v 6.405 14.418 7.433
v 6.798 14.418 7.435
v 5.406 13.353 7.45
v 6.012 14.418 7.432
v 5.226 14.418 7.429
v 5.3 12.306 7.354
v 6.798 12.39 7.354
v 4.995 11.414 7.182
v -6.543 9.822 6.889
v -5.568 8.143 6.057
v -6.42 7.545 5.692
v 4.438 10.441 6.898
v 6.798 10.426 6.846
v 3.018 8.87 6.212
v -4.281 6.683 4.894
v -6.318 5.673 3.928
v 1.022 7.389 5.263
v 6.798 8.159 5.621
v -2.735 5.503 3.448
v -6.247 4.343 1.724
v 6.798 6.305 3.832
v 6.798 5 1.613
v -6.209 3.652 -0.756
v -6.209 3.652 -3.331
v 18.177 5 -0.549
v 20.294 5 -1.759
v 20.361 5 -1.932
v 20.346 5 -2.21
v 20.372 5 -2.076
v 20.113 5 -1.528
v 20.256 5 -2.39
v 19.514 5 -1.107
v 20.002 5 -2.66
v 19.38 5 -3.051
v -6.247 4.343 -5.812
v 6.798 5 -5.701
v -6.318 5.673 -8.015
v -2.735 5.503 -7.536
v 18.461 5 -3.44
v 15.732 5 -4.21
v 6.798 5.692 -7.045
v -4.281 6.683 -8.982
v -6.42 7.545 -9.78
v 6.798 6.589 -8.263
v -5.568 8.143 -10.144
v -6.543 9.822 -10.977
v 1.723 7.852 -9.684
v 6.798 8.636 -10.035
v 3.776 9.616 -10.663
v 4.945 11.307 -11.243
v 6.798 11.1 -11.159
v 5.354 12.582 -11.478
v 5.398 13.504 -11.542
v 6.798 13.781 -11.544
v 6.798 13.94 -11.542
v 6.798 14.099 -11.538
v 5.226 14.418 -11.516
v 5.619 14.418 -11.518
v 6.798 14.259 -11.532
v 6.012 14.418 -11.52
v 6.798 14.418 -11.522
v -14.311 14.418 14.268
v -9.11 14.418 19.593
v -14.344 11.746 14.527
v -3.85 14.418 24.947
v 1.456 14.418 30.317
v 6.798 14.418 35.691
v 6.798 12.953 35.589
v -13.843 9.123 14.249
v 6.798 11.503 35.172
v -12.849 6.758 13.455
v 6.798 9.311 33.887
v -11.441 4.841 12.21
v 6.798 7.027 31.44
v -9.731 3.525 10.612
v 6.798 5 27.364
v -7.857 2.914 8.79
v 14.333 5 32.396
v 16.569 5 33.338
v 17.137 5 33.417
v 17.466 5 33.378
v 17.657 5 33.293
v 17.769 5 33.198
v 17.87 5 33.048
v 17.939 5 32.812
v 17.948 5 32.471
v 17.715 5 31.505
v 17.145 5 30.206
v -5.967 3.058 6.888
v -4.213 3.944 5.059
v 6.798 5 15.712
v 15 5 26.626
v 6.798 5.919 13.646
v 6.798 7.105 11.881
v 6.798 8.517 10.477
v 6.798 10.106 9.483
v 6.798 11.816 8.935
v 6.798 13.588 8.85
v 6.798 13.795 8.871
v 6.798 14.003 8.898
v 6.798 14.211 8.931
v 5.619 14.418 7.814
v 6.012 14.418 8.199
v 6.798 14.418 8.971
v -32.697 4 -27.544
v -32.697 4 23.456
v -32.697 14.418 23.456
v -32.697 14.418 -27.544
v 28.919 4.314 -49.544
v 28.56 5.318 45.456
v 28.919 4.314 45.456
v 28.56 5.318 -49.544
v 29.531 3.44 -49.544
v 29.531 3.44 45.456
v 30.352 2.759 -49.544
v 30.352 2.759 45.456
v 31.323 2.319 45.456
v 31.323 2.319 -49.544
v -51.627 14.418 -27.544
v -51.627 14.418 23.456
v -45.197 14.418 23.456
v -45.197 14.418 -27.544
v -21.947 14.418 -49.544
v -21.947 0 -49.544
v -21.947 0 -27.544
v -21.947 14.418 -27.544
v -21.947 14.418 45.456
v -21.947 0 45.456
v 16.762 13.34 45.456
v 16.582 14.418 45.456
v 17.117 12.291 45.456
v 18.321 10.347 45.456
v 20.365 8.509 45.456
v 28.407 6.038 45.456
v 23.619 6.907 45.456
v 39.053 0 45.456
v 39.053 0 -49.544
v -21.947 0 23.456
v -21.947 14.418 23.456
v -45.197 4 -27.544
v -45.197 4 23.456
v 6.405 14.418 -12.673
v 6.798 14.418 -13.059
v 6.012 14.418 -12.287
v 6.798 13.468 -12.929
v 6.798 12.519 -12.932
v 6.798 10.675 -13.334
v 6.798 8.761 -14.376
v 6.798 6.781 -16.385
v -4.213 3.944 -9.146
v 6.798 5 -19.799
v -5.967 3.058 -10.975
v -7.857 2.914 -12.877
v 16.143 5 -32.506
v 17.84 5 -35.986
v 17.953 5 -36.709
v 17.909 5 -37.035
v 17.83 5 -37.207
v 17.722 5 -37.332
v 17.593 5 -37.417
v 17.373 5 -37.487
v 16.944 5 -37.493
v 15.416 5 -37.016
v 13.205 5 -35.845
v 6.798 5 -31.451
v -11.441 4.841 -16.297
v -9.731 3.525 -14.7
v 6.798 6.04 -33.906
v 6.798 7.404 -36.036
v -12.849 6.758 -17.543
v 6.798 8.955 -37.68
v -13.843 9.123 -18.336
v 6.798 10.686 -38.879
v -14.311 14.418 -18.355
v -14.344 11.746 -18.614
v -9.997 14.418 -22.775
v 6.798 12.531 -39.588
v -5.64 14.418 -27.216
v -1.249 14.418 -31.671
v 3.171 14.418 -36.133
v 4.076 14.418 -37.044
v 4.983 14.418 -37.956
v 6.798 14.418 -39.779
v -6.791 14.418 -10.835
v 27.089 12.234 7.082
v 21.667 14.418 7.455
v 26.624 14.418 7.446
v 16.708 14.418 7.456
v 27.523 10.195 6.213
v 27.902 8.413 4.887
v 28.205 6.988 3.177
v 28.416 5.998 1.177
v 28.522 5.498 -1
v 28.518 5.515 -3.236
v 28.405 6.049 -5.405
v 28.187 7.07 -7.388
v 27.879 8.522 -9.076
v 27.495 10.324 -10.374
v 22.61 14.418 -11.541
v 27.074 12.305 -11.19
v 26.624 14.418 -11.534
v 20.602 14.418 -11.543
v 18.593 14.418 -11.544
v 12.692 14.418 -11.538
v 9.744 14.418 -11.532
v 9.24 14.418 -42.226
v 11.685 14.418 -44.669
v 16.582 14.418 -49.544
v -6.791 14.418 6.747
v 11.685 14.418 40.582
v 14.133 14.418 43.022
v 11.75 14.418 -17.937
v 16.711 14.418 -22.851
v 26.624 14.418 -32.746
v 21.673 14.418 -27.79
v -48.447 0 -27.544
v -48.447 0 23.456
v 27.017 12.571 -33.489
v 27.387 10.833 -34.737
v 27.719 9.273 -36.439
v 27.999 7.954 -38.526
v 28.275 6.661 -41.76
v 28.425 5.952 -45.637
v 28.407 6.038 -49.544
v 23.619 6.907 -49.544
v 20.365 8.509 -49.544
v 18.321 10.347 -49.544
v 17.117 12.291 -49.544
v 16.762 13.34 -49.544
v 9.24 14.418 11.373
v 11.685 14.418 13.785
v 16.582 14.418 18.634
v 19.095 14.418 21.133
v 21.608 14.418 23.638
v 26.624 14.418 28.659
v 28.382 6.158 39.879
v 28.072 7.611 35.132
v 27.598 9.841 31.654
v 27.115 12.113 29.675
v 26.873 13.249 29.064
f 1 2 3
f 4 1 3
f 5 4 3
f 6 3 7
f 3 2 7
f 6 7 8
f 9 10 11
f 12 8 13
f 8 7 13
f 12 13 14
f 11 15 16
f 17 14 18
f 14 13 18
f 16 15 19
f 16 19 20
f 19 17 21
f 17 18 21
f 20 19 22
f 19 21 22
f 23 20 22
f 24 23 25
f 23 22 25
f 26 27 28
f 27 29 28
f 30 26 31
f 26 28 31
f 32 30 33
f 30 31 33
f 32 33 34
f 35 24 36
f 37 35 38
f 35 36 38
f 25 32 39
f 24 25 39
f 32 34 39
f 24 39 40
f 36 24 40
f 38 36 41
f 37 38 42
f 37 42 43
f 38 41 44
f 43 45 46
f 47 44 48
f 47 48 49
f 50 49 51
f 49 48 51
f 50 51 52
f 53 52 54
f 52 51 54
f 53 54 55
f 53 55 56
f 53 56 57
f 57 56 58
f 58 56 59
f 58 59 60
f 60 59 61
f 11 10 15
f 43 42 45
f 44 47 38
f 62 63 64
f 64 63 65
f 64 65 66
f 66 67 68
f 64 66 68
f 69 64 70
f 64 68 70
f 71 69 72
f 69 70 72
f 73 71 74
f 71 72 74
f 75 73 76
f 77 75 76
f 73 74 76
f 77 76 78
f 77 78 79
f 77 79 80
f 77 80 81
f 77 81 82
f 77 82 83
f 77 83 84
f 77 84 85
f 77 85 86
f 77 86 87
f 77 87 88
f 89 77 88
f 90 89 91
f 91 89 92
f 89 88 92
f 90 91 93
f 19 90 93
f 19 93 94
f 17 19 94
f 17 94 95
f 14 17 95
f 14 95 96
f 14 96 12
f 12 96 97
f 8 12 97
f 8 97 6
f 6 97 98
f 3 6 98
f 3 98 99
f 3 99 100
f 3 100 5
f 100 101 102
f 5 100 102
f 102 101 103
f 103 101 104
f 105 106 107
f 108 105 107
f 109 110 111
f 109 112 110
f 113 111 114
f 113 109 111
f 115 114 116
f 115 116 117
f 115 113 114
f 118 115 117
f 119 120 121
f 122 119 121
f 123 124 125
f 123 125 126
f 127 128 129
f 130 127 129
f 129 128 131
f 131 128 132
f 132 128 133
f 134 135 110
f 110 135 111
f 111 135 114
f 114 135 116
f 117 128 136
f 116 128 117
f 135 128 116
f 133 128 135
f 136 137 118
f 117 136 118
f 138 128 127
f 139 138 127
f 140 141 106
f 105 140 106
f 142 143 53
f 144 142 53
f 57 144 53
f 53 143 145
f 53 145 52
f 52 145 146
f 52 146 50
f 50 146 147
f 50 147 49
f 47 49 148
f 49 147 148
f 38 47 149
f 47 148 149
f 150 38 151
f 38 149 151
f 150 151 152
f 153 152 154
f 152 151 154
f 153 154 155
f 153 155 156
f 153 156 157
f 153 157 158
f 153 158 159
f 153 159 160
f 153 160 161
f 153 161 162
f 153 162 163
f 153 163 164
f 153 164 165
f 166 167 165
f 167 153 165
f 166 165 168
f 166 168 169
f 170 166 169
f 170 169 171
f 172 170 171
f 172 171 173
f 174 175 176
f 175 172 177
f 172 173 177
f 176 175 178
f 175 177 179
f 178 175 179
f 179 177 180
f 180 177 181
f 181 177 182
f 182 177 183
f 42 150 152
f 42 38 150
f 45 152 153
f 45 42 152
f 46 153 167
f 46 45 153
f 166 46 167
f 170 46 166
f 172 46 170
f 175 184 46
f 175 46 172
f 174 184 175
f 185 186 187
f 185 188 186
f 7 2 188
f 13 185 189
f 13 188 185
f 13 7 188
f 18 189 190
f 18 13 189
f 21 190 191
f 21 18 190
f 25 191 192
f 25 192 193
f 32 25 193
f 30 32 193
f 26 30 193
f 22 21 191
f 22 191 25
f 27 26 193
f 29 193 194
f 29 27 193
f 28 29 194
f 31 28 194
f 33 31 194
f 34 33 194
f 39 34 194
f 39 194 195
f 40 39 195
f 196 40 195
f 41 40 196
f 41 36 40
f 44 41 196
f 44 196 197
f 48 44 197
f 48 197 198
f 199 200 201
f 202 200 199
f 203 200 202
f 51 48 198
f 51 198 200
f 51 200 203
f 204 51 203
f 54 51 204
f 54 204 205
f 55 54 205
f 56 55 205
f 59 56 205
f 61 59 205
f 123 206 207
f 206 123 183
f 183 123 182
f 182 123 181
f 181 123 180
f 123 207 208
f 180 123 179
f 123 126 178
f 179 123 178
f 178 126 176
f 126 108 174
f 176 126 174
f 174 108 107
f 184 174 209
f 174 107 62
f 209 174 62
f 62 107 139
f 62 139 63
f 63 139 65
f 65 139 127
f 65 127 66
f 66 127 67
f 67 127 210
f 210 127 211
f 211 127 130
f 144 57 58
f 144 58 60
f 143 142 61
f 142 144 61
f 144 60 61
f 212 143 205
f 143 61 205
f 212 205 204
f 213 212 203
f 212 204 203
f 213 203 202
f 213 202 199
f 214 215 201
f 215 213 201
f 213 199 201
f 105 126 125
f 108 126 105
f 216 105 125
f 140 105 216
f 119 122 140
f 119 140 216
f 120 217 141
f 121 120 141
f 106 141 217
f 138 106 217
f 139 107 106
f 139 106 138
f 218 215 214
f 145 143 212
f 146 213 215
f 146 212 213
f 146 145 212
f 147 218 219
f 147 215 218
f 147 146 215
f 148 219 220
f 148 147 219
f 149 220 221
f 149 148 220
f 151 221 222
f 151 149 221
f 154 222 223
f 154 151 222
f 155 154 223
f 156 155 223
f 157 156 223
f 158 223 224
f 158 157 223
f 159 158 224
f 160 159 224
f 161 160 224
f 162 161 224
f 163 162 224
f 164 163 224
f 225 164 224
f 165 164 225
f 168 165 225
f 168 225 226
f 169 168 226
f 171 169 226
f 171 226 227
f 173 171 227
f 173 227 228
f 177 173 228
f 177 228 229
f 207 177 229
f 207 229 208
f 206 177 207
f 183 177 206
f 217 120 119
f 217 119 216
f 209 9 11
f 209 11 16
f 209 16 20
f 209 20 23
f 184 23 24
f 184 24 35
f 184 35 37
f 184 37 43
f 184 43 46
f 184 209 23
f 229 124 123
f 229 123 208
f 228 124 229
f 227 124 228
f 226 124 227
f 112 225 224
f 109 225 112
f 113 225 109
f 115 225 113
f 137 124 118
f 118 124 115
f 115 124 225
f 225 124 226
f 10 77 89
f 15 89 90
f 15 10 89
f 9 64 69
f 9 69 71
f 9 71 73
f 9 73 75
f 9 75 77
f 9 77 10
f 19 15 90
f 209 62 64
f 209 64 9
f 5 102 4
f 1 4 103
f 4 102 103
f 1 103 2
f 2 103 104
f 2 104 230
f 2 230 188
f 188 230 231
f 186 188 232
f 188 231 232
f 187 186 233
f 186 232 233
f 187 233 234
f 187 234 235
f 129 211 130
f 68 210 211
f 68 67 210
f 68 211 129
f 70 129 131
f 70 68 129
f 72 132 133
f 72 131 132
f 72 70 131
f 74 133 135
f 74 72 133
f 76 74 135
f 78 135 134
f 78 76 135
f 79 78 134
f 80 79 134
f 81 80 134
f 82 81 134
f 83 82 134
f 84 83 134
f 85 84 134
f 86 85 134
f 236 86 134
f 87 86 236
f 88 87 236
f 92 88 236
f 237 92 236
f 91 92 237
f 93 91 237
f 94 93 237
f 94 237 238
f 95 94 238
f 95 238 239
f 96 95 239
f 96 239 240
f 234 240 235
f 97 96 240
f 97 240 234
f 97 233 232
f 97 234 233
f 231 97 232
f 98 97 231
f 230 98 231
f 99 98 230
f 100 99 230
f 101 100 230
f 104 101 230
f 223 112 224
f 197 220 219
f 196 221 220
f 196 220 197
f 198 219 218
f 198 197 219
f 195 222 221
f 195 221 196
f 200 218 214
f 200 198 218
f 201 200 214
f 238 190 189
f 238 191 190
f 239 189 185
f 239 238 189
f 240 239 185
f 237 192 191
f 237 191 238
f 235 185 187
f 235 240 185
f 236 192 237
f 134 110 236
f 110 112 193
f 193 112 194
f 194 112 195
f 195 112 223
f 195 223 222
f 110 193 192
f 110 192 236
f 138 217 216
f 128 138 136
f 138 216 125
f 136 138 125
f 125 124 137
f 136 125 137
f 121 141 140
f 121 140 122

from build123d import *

# Parameters (mm, degrees)
SKETCH1_W           = 95
SKETCH1_H           = 95
BOSS_EXTRUDE1_DEPTH = 50
CUT_EXTRUDE1_DEPTH  = 100
SKETCH3_R           = 9.5
CUT_EXTRUDE2_DEPTH  = 45
CUT_EXTRUDE4_DEPTH  = 45
CUT_EXTRUDE5_DEPTH  = 45
CUT_EXTRUDE6_DEPTH  = 45
CUT_EXTRUDE7_DEPTH  = 45
SKETCH9_R           = 9.5
CUT_EXTRUDE9_DEPTH  = 45
SKETCH11_R          = 9.5
CUT_EXTRUDE10_DEPTH = 45
SKETCH12_W          = 31.985759797
SKETCH12_H          = 95
BOSS_EXTRUDE2_DEPTH = 45
CUT_EXTRUDE11_DEPTH = 100
SKETCH14_R          = 9.5
CUT_EXTRUDE12_DEPTH = 100
SKETCH15_R          = 9.5
CUT_EXTRUDE13_DEPTH = 100
SKETCH16_R          = 9.5
CUT_EXTRUDE14_DEPTH = 100
FILLET2_R           = 4
SKETCH17_W          = 34
SKETCH17_H          = 34
CUT_EXTRUDE16_DEPTH = 22
SKETCH19_W          = 34
SKETCH19_H          = 34
CUT_EXTRUDE17_DEPTH = 22
SKETCH20_W          = 12.5
SKETCH20_H          = 16.5
CUT_EXTRUDE18_DEPTH = 60
CUT_EXTRUDE19_DEPTH = 60
CUT_EXTRUDE20_DEPTH = 100


with BuildPart() as part:
    # Sketch1 → Boss-Extrude1 (new body)
    with BuildSketch(Plane(origin=(0, 0, 0), x_dir=(1, 0, 0), z_dir=(0, 1, 0))):
        with Locations((-8.446550514, 2.043801884)):
            Rectangle(SKETCH1_W, SKETCH1_H)
    extrude(amount=BOSS_EXTRUDE1_DEPTH)

    # Sketch2 → Cut-Extrude1 (cut)
    with BuildSketch(Plane.XY.offset(45.456198116)):
        Polygon((39.053449486, 0), (36.353449486, 50), (39.053449486, 50), align=None)
    extrude(amount=-CUT_EXTRUDE1_DEPTH, mode=Mode.SUBTRACT)

    # Sketch3 → Cut-Extrude2 (cut)
    with BuildSketch(Plane(origin=(38.939900735, 2.10275464, 0), x_dir=(0, 0, -1), z_dir=(0.998545181, 0.05392144, 0))):
        with Locations((2.043801884, 13.394181776)):
            Circle(SKETCH3_R)
    extrude(amount=-CUT_EXTRUDE2_DEPTH, mode=Mode.SUBTRACT)

    # Sketch5 → Cut-Extrude4 (cut)
    with BuildSketch(Plane(origin=(0, 50, 0), x_dir=(1, 0, 0), z_dir=(0, 1, 0))):
        Polygon((39.053449486, 49.543801884), (39.053449486, 29.543801884), (19.053449486, 49.543801884), align=None)
        Polygon((39.053449486, -45.456198116), (39.053449486, -25.456198116), (19.053449486, -45.456198116), align=None)
    extrude(amount=-CUT_EXTRUDE4_DEPTH, mode=Mode.SUBTRACT)

    # Sketch6 → Cut-Extrude5 (cut)
    with BuildSketch(Plane(origin=(0, 50, 0), x_dir=(1, 0, 0), z_dir=(0, 1, 0))):
        Polygon((19.053449486, -45.456198116), (12.925569587, -39.328318218), (6.797689689, -45.456198116), align=None)
        Polygon((19.053449486, 49.543801884), (12.925569587, 43.415921985), (6.797689689, 49.543801884), align=None)
    extrude(amount=-CUT_EXTRUDE5_DEPTH, mode=Mode.SUBTRACT)

    # Sketch7 → Cut-Extrude6 (cut)
    with BuildSketch(Plane(origin=(-13.201374315, 0, 13.201374315), x_dir=(0.707106781, 0, 0.707106781), z_dir=(-0.707106781, 0, 0.707106781))):
        Polygon((45.615209271, 5), (42.915209271, 50), (45.615209271, 50), align=None)
    extrude(amount=-CUT_EXTRUDE6_DEPTH, mode=Mode.SUBTRACT)

    # Sketch8 → Cut-Extrude7 (cut)
    with BuildSketch(Plane(origin=(-15.245176199, 0, -15.245176199), x_dir=(-0.707106781, 0, 0.707106781), z_dir=(-0.707106781, 0, -0.707106781))):
        Polygon((-48.505581614, 5), (-45.805581614, 50), (-48.505581614, 50), align=None)
    extrude(amount=-CUT_EXTRUDE7_DEPTH, mode=Mode.SUBTRACT)

    # Sketch9 → Cut-Extrude9 (cut)
    with BuildSketch(Plane(origin=(34.386964646, 2.917830706, -34.386964646), x_dir=(-0.708373873, 0.059677836, -0.70331004), z_dir=(0.705837415, 0.059892291, -0.705837415))):
        with Locations((14.526974541, 11.311121921)):
            Circle(SKETCH9_R)
    extrude(amount=-CUT_EXTRUDE9_DEPTH, mode=Mode.SUBTRACT)

    # Sketch11 → Cut-Extrude10 (cut)
    with BuildSketch(Plane(origin=(32.350494057, 2.745030447, 32.350494057), x_dir=(0.70331004, 0.059677836, -0.708373873), z_dir=(0.705837415, 0.059892291, 0.705837415))):
        with Locations((-10.17752107, 12.964151979)):
            Circle(SKETCH11_R)
    extrude(amount=-CUT_EXTRUDE10_DEPTH, mode=Mode.SUBTRACT)

    # Sketch12 → Boss-Extrude2 (add)
    with BuildSketch(Plane(origin=(0, 5, 0), x_dir=(1, 0, 0), z_dir=(0, 1, 0))):
        with Locations((22.790569588, 2.043801884)):
            Rectangle(SKETCH12_W, SKETCH12_H)
    extrude(amount=BOSS_EXTRUDE2_DEPTH)

    # Sketch13 → Cut-Extrude11 (cut)
    with BuildSketch(Plane.XY.offset(45.456198116)):
        Polygon((39.053449486, 0), (29.053449486, 3), (19.053449486, 50), (49.745275601, 50), align=None)
    extrude(amount=-CUT_EXTRUDE11_DEPTH, mode=Mode.SUBTRACT)

    # Sketch14 → Cut-Extrude12 (cut)
    with BuildSketch(Plane(origin=(-5.994632406, -0.32371015, 0), x_dir=(0, 0, -1), z_dir=(0.998545181, 0.05392144, 0))):
        with Locations((2.043801884, 13.394181776)):
            Circle(SKETCH14_R)
    extrude(amount=CUT_EXTRUDE12_DEPTH, mode=Mode.SUBTRACT)

    # Sketch15 → Cut-Extrude13 (cut)
    with BuildSketch(Plane(origin=(0.587810371, 0.049877364, 0.587810371), x_dir=(0.70331004, 0.059677836, -0.708373873), z_dir=(0.705837415, 0.059892291, 0.705837415))):
        with Locations((-10.17752107, 12.964151979)):
            Circle(SKETCH15_R)
    extrude(amount=CUT_EXTRUDE13_DEPTH, mode=Mode.SUBTRACT)

    # Sketch16 → Cut-Extrude14 (cut)
    with BuildSketch(Plane(origin=(2.62428096, 0.222677624, -2.62428096), x_dir=(-0.708373873, 0.059677836, -0.70331004), z_dir=(0.705837415, 0.059892291, -0.705837415))):
        with Locations((14.526974541, 11.311121921)):
            Circle(SKETCH16_R)
    extrude(amount=CUT_EXTRUDE14_DEPTH, mode=Mode.SUBTRACT)

    # Fillet2
    fillet2_edges = [part.edges().sort_by_distance(p)[0] for p in [
        (29.053449486, 3, -2.043801884),
    ]]
    fillet(fillet2_edges, radius=FILLET2_R)

    # Sketch17 → Cut-Extrude16 (cut)
    with BuildSketch(Plane.XY.offset(45.456198116)):
        with Locations((-38.946550514, 17)):
            Rectangle(SKETCH17_W, SKETCH17_H)
    extrude(amount=-CUT_EXTRUDE16_DEPTH, mode=Mode.SUBTRACT)

    # Sketch19 → Cut-Extrude17 (cut)
    with BuildSketch(Plane(origin=(0, 0, -49.543801884), x_dir=(-1, 0, 0), z_dir=(0, 0, -1))):
        with Locations((38.946550514, 17)):
            Rectangle(SKETCH19_W, SKETCH19_H)
    extrude(amount=-CUT_EXTRUDE17_DEPTH, mode=Mode.SUBTRACT)

    # Sketch20 → Cut-Extrude18 (cut)
    with BuildSketch(Plane.XY.offset(23.456198116)):
        with Locations((-38.946550514, 12.25)):
            Rectangle(SKETCH20_W, SKETCH20_H)
    extrude(amount=-CUT_EXTRUDE18_DEPTH, mode=Mode.SUBTRACT)

    # Sketch21 → Cut-Extrude19 (cut)
    with BuildSketch(Plane.XY.offset(23.456198116)):
        Polygon((-55.946550514, 34), (-48.446550514, 0), (-55.946550514, 0), align=None)
    extrude(amount=-CUT_EXTRUDE19_DEPTH, mode=Mode.SUBTRACT)

    # Sketch22 → Cut-Extrude20 (cut)
    with BuildSketch(Plane.XY.offset(45.456198116)):
        Polygon((16.581652311, 14.417739075), (-57.762384818, 14.417739075), (-57.762384818, 55.877932289), (42.054048577, 55.877932289), (42.054048577, 14.417739075), align=None)
    extrude(amount=-CUT_EXTRUDE20_DEPTH, mode=Mode.SUBTRACT)


solid = part.part
